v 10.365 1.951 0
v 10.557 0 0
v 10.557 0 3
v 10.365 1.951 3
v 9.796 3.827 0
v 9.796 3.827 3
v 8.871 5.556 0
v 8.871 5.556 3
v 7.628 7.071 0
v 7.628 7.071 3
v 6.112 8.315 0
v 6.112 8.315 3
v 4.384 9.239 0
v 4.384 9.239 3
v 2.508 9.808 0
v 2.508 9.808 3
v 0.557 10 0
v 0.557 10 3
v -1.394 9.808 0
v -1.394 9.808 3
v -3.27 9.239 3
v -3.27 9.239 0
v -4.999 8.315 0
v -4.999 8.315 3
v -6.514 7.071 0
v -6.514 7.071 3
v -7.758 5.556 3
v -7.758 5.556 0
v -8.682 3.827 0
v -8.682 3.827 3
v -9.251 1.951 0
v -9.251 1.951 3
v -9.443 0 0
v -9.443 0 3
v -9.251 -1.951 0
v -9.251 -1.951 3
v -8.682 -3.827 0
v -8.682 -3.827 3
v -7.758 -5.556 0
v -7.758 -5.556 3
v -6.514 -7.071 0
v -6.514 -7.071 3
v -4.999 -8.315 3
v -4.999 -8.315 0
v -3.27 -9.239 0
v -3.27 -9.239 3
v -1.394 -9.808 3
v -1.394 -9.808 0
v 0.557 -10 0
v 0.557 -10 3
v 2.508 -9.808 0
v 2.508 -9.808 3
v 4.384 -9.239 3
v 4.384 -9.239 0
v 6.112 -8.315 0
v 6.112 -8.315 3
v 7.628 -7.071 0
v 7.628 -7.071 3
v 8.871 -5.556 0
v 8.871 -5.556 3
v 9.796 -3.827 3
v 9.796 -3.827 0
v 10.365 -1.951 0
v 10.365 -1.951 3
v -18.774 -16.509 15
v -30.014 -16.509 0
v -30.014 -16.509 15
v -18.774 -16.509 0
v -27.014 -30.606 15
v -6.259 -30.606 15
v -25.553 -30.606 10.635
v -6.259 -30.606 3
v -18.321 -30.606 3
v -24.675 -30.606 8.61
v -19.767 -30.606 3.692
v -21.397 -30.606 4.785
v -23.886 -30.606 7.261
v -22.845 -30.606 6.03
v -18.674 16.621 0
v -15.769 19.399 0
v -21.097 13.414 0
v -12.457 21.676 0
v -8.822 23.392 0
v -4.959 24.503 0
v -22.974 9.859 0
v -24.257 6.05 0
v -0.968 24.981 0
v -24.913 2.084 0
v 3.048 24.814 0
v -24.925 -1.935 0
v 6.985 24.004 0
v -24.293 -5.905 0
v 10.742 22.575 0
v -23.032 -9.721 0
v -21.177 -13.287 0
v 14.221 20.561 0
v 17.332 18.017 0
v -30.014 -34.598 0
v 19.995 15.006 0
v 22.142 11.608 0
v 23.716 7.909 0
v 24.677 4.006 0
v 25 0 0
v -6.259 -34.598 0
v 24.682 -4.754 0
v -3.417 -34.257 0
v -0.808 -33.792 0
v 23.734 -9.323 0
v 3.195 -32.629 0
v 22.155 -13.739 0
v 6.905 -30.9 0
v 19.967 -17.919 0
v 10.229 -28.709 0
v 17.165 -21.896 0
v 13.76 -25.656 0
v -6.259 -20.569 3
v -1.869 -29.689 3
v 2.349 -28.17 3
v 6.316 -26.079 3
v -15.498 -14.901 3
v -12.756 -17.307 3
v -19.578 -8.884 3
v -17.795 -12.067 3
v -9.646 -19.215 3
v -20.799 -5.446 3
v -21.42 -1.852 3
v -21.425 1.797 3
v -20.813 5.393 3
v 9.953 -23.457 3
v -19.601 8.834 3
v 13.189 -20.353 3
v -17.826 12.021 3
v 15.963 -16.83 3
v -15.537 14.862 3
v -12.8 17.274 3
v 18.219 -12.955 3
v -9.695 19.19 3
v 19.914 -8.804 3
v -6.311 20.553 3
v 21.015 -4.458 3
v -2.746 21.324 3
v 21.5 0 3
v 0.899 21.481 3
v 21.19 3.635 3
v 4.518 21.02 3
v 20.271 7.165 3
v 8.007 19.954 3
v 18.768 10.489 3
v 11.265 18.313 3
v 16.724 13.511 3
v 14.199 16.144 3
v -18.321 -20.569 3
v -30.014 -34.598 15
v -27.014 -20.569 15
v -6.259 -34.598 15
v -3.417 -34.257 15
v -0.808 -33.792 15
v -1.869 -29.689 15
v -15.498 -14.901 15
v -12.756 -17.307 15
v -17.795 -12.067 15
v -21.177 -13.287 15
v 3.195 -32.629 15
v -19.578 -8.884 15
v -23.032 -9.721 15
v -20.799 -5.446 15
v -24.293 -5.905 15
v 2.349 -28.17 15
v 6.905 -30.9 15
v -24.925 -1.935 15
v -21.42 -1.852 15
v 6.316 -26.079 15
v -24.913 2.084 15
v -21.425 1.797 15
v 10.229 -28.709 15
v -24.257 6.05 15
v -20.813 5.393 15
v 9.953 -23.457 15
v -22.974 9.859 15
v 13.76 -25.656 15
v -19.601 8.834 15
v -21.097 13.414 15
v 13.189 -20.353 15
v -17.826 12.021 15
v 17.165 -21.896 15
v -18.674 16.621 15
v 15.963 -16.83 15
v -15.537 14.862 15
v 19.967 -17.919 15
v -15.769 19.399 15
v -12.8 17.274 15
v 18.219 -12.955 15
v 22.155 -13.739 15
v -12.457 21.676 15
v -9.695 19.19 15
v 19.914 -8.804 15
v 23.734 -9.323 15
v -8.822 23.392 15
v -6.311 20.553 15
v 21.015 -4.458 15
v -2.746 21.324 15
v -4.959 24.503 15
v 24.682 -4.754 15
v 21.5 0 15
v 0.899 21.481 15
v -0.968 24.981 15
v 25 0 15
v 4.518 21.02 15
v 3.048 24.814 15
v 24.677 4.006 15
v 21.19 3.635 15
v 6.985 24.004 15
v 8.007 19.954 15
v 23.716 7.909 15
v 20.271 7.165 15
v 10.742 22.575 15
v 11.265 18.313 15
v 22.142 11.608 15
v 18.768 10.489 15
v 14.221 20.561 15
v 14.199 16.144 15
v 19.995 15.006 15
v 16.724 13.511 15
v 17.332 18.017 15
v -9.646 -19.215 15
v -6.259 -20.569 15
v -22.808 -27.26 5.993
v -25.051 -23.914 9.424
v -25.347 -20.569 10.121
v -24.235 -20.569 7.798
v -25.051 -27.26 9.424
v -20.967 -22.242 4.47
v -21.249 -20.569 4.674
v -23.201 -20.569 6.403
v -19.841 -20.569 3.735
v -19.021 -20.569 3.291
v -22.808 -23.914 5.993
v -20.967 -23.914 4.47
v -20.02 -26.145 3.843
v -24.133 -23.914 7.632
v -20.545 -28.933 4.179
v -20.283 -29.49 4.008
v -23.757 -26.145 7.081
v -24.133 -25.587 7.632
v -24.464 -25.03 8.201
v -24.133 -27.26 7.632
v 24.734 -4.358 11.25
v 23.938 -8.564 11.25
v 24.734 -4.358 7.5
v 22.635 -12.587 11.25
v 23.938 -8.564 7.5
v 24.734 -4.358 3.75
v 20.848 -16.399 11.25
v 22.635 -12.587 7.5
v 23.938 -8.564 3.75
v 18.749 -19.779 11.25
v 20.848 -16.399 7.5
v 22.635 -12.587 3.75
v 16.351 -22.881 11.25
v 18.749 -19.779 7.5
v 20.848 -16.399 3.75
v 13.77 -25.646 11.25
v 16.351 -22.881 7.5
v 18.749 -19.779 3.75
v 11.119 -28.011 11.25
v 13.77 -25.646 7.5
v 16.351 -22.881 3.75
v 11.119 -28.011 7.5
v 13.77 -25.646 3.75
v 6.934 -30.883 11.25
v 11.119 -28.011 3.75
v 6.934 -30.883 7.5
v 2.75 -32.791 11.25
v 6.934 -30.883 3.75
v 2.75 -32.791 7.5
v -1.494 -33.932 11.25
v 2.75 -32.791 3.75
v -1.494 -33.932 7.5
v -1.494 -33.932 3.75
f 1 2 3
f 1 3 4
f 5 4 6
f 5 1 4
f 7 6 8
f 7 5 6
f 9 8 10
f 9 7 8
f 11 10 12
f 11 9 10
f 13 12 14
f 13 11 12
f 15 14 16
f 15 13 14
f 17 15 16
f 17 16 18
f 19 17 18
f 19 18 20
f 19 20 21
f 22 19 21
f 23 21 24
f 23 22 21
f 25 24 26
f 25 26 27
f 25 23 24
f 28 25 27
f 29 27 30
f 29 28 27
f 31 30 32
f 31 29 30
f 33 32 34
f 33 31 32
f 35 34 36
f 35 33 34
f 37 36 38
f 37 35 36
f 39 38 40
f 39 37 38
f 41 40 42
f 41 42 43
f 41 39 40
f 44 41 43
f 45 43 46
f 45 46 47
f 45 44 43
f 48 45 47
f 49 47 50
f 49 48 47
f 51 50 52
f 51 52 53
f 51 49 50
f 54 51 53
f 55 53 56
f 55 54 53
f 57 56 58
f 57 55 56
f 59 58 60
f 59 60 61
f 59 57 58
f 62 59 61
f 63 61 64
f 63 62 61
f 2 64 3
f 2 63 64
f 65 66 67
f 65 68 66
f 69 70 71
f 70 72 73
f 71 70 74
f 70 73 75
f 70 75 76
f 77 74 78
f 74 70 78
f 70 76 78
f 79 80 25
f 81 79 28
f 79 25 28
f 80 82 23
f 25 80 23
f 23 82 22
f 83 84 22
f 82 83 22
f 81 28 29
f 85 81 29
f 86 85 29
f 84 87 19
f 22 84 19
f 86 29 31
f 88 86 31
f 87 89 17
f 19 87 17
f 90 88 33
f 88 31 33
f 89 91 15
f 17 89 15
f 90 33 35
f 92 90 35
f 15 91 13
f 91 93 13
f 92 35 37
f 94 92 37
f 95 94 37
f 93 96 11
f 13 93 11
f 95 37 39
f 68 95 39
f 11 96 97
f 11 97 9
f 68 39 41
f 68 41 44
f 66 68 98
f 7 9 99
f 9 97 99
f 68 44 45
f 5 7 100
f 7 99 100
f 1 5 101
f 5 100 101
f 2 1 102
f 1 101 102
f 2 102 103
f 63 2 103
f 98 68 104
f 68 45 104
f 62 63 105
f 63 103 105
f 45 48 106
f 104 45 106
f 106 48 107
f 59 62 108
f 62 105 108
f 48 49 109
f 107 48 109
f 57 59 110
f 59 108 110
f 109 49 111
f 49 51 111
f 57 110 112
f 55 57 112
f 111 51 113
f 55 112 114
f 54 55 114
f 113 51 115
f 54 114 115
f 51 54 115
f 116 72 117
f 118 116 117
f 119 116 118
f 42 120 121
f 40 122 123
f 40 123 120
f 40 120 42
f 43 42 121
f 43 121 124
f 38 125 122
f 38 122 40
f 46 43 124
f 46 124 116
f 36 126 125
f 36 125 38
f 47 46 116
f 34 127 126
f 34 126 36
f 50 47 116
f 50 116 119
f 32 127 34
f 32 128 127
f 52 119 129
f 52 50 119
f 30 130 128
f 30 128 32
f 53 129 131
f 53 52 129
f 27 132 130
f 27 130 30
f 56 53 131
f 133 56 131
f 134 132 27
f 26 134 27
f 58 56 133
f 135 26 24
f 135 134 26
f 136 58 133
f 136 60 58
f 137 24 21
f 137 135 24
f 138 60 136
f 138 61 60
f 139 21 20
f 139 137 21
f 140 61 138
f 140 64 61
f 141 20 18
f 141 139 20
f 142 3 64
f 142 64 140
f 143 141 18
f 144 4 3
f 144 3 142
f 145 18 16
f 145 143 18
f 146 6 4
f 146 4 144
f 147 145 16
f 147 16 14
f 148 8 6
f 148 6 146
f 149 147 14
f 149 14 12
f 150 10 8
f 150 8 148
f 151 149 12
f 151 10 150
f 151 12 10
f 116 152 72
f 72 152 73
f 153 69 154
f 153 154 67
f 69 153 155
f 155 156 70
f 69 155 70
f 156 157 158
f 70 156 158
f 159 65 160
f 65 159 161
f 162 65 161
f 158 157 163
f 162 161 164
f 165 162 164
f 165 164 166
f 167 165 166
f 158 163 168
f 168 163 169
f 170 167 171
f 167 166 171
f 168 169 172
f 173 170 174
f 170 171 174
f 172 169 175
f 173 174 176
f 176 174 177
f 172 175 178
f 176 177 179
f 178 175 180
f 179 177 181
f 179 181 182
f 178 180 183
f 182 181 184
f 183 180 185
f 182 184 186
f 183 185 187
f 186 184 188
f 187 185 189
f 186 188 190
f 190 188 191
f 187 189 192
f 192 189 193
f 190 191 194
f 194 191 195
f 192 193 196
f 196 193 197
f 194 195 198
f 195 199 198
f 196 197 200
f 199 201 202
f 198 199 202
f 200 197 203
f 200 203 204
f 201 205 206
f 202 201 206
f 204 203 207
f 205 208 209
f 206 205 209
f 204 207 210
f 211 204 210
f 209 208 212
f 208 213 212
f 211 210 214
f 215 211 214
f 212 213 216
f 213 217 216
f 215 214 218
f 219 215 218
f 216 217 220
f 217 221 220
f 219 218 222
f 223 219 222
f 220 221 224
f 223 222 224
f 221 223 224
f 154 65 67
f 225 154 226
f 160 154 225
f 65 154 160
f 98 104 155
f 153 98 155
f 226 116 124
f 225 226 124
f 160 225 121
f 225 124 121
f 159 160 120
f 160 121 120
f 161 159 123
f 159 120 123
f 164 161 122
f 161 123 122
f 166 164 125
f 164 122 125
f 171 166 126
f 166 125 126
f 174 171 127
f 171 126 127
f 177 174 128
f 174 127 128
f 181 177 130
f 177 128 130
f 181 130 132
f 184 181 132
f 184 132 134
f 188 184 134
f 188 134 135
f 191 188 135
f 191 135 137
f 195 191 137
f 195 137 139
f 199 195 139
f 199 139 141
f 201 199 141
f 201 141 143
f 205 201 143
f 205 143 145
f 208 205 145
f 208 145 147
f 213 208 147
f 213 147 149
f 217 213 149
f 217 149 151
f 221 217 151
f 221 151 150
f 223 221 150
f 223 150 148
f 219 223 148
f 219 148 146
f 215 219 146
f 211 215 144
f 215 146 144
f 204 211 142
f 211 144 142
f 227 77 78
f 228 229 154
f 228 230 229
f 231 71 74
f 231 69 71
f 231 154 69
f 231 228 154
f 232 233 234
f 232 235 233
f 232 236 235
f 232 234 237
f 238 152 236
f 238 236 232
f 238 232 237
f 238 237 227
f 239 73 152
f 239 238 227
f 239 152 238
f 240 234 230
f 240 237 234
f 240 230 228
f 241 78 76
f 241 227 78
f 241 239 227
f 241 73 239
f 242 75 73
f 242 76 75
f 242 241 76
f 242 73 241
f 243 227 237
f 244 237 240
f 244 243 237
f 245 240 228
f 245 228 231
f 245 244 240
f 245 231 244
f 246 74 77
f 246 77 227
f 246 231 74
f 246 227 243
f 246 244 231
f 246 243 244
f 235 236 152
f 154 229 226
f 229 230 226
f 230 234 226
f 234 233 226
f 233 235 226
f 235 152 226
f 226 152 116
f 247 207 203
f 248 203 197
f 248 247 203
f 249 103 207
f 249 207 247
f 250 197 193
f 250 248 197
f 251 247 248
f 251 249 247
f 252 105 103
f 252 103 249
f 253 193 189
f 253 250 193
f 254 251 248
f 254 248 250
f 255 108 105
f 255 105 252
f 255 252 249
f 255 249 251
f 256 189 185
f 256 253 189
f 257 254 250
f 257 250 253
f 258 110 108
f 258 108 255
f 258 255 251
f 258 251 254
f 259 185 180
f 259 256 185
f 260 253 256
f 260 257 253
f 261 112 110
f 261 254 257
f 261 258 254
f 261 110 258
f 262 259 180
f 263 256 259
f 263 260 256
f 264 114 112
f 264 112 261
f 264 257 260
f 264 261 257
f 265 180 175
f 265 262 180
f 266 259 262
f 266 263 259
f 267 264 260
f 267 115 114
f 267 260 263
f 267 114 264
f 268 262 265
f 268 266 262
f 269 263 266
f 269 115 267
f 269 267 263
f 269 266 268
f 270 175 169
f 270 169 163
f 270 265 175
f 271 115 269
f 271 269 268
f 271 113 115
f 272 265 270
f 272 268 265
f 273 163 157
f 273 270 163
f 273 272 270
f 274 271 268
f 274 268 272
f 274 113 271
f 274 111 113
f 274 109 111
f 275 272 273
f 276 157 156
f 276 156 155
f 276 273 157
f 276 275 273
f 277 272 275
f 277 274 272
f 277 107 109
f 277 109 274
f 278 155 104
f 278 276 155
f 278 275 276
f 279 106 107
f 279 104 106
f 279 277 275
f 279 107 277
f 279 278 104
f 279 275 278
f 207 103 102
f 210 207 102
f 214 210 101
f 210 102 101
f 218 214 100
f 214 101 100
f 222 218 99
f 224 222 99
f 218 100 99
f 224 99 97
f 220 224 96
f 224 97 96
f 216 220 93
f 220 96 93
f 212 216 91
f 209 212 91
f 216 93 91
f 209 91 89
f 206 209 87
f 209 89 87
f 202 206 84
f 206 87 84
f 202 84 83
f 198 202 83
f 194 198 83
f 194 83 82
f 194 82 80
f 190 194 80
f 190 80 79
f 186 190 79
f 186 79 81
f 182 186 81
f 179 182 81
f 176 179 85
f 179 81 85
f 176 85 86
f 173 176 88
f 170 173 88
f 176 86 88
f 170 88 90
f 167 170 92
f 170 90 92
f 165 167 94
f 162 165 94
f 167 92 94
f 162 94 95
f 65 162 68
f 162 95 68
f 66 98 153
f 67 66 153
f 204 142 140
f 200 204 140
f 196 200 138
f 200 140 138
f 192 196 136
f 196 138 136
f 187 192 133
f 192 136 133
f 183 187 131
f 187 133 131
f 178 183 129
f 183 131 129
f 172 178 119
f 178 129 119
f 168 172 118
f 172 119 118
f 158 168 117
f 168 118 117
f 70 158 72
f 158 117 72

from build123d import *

# Parameters (mm, degrees)
F1_DEPTH = 15
F0_R     = 10
F2_DEPTH = 3
F4_DEPTH = 11
F5_DEPTH = 3


with BuildPart() as f1:
    # F0 (on Top) → F1 (new body)
    with BuildSketch(Plane.XY):
        with BuildLine():
            add(Edge.make_bspline(
                [(25, 0), (25.0087002696, -5.8990169969), (22.1552822861, -16.7434149041), (11.7382328833, -28.4109430259), (2.8895078726, -33.2599749563), (-2.8164344422, -34.2581364978), (-6.2585137784, -34.5978120347)],
                knots=[0, 0, 0, 0, 0.2908567046, 0.5661013385, 0.7856454444, 1, 1, 1, 1], degree=3))
            ThreePointArc((25, 0), (-8.821991792, 23.3917177826), (-18.7737968657, -16.5089233823))
            Line((-18.7737968657, -16.5089233823), (-27.0137283951, -16.5089233823))
            Line((-27.0137283951, -16.5089233823), (-27.0137283951, -20.5689330128))
            Line((-27.0137283951, -20.5689330128), (-23.3377733697, -20.5689330128))
            Line((-23.3377733697, -20.5689330128), (-14.2098203618, -20.5689330128))
            Line((-14.2098203618, -20.5689330128), (-6.2585137784, -20.5689330128))
            ThreePointArc((-6.2585137784, -20.5689330128), (-12.8002334698, 17.2743747533), (21.5, 0))
            ThreePointArc((21.5, 0), (13.189427122, -20.3534456592), (-6.2585137784, -30.6055657566))
            Line((-6.2585137784, -30.6055657566), (-23.3377733697, -30.6055657566))
            Line((-23.3377733697, -30.6055657566), (-27.0137283951, -30.6055657566))
            Line((-27.0137283951, -30.6055657566), (-27.0137283951, -34.5978120347))
            Line((-27.0137283951, -34.5978120347), (-6.2585137784, -34.5978120347))
        make_face()
    extrude(amount=F1_DEPTH)

    # F0 (on Top) → F2 (join)
    with BuildSketch(Plane.XY):
        with BuildLine():
            Line((-23.3377733697, -20.5689330128), (-27.0137283951, -20.5689330128))
            Line((-27.0137283951, -20.5689330128), (-27.0137283951, -21.3873516768))
            Line((-27.0137283951, -21.3873516768), (-27.0137283951, -30.6055657566))
            Line((-27.0137283951, -30.6055657566), (-23.3377733697, -30.6055657566))
            Line((-23.3377733697, -30.6055657566), (-6.2585137784, -30.6055657566))
            ThreePointArc((-6.2585137784, -30.6055657566), (13.189427122, -20.3534456592), (21.5, 0))
            ThreePointArc((21.5, 0), (-12.8002334698, 17.2743747533), (-6.2585137784, -20.5689330128))
            Line((-6.2585137784, -20.5689330128), (-14.2098203618, -20.5689330128))
            Line((-14.2098203618, -20.5689330128), (-23.3377733697, -20.5689330128))
        make_face()
        with Locations((0.5567180342, 0)):
            Circle(F0_R, mode=Mode.SUBTRACT)
    extrude(amount=F2_DEPTH)

    # F3 (on face) → F4 (join)
    with BuildSketch(Plane(origin=(0, -30.6055657566, 0), x_dir=(-1, 0, 0), z_dir=(0, 1, 0))):
        with BuildLine():
            add(Edge.make_bspline(
                [(18.3209385723, 3), (19.5423853219, 3.4077423094), (23.2709452392, 5.8971211647), (25.1604775917, 9.372303958), (26.423119613, 12.9164144641), (27.0137283951, 15)],
                knots=[0, 0, 0, 0, 0.3426311752, 0.6413082257, 1, 1, 1, 1], degree=3))
            Line((18.3209385723, 3), (27.0137283951, 3))
            Line((27.0137283951, 3), (27.0137283951, 15))
        make_face()
    extrude(amount=F4_DEPTH)

    # F5 (add): a face of the model
    f5_faces = [f1.faces().sort_by_distance(p)[0] for p in [
        (-27.0137283951, -25.5533677085, 7.5),
    ]]
    extrude(f5_faces, amount=F5_DEPTH)


solid = f1.part
